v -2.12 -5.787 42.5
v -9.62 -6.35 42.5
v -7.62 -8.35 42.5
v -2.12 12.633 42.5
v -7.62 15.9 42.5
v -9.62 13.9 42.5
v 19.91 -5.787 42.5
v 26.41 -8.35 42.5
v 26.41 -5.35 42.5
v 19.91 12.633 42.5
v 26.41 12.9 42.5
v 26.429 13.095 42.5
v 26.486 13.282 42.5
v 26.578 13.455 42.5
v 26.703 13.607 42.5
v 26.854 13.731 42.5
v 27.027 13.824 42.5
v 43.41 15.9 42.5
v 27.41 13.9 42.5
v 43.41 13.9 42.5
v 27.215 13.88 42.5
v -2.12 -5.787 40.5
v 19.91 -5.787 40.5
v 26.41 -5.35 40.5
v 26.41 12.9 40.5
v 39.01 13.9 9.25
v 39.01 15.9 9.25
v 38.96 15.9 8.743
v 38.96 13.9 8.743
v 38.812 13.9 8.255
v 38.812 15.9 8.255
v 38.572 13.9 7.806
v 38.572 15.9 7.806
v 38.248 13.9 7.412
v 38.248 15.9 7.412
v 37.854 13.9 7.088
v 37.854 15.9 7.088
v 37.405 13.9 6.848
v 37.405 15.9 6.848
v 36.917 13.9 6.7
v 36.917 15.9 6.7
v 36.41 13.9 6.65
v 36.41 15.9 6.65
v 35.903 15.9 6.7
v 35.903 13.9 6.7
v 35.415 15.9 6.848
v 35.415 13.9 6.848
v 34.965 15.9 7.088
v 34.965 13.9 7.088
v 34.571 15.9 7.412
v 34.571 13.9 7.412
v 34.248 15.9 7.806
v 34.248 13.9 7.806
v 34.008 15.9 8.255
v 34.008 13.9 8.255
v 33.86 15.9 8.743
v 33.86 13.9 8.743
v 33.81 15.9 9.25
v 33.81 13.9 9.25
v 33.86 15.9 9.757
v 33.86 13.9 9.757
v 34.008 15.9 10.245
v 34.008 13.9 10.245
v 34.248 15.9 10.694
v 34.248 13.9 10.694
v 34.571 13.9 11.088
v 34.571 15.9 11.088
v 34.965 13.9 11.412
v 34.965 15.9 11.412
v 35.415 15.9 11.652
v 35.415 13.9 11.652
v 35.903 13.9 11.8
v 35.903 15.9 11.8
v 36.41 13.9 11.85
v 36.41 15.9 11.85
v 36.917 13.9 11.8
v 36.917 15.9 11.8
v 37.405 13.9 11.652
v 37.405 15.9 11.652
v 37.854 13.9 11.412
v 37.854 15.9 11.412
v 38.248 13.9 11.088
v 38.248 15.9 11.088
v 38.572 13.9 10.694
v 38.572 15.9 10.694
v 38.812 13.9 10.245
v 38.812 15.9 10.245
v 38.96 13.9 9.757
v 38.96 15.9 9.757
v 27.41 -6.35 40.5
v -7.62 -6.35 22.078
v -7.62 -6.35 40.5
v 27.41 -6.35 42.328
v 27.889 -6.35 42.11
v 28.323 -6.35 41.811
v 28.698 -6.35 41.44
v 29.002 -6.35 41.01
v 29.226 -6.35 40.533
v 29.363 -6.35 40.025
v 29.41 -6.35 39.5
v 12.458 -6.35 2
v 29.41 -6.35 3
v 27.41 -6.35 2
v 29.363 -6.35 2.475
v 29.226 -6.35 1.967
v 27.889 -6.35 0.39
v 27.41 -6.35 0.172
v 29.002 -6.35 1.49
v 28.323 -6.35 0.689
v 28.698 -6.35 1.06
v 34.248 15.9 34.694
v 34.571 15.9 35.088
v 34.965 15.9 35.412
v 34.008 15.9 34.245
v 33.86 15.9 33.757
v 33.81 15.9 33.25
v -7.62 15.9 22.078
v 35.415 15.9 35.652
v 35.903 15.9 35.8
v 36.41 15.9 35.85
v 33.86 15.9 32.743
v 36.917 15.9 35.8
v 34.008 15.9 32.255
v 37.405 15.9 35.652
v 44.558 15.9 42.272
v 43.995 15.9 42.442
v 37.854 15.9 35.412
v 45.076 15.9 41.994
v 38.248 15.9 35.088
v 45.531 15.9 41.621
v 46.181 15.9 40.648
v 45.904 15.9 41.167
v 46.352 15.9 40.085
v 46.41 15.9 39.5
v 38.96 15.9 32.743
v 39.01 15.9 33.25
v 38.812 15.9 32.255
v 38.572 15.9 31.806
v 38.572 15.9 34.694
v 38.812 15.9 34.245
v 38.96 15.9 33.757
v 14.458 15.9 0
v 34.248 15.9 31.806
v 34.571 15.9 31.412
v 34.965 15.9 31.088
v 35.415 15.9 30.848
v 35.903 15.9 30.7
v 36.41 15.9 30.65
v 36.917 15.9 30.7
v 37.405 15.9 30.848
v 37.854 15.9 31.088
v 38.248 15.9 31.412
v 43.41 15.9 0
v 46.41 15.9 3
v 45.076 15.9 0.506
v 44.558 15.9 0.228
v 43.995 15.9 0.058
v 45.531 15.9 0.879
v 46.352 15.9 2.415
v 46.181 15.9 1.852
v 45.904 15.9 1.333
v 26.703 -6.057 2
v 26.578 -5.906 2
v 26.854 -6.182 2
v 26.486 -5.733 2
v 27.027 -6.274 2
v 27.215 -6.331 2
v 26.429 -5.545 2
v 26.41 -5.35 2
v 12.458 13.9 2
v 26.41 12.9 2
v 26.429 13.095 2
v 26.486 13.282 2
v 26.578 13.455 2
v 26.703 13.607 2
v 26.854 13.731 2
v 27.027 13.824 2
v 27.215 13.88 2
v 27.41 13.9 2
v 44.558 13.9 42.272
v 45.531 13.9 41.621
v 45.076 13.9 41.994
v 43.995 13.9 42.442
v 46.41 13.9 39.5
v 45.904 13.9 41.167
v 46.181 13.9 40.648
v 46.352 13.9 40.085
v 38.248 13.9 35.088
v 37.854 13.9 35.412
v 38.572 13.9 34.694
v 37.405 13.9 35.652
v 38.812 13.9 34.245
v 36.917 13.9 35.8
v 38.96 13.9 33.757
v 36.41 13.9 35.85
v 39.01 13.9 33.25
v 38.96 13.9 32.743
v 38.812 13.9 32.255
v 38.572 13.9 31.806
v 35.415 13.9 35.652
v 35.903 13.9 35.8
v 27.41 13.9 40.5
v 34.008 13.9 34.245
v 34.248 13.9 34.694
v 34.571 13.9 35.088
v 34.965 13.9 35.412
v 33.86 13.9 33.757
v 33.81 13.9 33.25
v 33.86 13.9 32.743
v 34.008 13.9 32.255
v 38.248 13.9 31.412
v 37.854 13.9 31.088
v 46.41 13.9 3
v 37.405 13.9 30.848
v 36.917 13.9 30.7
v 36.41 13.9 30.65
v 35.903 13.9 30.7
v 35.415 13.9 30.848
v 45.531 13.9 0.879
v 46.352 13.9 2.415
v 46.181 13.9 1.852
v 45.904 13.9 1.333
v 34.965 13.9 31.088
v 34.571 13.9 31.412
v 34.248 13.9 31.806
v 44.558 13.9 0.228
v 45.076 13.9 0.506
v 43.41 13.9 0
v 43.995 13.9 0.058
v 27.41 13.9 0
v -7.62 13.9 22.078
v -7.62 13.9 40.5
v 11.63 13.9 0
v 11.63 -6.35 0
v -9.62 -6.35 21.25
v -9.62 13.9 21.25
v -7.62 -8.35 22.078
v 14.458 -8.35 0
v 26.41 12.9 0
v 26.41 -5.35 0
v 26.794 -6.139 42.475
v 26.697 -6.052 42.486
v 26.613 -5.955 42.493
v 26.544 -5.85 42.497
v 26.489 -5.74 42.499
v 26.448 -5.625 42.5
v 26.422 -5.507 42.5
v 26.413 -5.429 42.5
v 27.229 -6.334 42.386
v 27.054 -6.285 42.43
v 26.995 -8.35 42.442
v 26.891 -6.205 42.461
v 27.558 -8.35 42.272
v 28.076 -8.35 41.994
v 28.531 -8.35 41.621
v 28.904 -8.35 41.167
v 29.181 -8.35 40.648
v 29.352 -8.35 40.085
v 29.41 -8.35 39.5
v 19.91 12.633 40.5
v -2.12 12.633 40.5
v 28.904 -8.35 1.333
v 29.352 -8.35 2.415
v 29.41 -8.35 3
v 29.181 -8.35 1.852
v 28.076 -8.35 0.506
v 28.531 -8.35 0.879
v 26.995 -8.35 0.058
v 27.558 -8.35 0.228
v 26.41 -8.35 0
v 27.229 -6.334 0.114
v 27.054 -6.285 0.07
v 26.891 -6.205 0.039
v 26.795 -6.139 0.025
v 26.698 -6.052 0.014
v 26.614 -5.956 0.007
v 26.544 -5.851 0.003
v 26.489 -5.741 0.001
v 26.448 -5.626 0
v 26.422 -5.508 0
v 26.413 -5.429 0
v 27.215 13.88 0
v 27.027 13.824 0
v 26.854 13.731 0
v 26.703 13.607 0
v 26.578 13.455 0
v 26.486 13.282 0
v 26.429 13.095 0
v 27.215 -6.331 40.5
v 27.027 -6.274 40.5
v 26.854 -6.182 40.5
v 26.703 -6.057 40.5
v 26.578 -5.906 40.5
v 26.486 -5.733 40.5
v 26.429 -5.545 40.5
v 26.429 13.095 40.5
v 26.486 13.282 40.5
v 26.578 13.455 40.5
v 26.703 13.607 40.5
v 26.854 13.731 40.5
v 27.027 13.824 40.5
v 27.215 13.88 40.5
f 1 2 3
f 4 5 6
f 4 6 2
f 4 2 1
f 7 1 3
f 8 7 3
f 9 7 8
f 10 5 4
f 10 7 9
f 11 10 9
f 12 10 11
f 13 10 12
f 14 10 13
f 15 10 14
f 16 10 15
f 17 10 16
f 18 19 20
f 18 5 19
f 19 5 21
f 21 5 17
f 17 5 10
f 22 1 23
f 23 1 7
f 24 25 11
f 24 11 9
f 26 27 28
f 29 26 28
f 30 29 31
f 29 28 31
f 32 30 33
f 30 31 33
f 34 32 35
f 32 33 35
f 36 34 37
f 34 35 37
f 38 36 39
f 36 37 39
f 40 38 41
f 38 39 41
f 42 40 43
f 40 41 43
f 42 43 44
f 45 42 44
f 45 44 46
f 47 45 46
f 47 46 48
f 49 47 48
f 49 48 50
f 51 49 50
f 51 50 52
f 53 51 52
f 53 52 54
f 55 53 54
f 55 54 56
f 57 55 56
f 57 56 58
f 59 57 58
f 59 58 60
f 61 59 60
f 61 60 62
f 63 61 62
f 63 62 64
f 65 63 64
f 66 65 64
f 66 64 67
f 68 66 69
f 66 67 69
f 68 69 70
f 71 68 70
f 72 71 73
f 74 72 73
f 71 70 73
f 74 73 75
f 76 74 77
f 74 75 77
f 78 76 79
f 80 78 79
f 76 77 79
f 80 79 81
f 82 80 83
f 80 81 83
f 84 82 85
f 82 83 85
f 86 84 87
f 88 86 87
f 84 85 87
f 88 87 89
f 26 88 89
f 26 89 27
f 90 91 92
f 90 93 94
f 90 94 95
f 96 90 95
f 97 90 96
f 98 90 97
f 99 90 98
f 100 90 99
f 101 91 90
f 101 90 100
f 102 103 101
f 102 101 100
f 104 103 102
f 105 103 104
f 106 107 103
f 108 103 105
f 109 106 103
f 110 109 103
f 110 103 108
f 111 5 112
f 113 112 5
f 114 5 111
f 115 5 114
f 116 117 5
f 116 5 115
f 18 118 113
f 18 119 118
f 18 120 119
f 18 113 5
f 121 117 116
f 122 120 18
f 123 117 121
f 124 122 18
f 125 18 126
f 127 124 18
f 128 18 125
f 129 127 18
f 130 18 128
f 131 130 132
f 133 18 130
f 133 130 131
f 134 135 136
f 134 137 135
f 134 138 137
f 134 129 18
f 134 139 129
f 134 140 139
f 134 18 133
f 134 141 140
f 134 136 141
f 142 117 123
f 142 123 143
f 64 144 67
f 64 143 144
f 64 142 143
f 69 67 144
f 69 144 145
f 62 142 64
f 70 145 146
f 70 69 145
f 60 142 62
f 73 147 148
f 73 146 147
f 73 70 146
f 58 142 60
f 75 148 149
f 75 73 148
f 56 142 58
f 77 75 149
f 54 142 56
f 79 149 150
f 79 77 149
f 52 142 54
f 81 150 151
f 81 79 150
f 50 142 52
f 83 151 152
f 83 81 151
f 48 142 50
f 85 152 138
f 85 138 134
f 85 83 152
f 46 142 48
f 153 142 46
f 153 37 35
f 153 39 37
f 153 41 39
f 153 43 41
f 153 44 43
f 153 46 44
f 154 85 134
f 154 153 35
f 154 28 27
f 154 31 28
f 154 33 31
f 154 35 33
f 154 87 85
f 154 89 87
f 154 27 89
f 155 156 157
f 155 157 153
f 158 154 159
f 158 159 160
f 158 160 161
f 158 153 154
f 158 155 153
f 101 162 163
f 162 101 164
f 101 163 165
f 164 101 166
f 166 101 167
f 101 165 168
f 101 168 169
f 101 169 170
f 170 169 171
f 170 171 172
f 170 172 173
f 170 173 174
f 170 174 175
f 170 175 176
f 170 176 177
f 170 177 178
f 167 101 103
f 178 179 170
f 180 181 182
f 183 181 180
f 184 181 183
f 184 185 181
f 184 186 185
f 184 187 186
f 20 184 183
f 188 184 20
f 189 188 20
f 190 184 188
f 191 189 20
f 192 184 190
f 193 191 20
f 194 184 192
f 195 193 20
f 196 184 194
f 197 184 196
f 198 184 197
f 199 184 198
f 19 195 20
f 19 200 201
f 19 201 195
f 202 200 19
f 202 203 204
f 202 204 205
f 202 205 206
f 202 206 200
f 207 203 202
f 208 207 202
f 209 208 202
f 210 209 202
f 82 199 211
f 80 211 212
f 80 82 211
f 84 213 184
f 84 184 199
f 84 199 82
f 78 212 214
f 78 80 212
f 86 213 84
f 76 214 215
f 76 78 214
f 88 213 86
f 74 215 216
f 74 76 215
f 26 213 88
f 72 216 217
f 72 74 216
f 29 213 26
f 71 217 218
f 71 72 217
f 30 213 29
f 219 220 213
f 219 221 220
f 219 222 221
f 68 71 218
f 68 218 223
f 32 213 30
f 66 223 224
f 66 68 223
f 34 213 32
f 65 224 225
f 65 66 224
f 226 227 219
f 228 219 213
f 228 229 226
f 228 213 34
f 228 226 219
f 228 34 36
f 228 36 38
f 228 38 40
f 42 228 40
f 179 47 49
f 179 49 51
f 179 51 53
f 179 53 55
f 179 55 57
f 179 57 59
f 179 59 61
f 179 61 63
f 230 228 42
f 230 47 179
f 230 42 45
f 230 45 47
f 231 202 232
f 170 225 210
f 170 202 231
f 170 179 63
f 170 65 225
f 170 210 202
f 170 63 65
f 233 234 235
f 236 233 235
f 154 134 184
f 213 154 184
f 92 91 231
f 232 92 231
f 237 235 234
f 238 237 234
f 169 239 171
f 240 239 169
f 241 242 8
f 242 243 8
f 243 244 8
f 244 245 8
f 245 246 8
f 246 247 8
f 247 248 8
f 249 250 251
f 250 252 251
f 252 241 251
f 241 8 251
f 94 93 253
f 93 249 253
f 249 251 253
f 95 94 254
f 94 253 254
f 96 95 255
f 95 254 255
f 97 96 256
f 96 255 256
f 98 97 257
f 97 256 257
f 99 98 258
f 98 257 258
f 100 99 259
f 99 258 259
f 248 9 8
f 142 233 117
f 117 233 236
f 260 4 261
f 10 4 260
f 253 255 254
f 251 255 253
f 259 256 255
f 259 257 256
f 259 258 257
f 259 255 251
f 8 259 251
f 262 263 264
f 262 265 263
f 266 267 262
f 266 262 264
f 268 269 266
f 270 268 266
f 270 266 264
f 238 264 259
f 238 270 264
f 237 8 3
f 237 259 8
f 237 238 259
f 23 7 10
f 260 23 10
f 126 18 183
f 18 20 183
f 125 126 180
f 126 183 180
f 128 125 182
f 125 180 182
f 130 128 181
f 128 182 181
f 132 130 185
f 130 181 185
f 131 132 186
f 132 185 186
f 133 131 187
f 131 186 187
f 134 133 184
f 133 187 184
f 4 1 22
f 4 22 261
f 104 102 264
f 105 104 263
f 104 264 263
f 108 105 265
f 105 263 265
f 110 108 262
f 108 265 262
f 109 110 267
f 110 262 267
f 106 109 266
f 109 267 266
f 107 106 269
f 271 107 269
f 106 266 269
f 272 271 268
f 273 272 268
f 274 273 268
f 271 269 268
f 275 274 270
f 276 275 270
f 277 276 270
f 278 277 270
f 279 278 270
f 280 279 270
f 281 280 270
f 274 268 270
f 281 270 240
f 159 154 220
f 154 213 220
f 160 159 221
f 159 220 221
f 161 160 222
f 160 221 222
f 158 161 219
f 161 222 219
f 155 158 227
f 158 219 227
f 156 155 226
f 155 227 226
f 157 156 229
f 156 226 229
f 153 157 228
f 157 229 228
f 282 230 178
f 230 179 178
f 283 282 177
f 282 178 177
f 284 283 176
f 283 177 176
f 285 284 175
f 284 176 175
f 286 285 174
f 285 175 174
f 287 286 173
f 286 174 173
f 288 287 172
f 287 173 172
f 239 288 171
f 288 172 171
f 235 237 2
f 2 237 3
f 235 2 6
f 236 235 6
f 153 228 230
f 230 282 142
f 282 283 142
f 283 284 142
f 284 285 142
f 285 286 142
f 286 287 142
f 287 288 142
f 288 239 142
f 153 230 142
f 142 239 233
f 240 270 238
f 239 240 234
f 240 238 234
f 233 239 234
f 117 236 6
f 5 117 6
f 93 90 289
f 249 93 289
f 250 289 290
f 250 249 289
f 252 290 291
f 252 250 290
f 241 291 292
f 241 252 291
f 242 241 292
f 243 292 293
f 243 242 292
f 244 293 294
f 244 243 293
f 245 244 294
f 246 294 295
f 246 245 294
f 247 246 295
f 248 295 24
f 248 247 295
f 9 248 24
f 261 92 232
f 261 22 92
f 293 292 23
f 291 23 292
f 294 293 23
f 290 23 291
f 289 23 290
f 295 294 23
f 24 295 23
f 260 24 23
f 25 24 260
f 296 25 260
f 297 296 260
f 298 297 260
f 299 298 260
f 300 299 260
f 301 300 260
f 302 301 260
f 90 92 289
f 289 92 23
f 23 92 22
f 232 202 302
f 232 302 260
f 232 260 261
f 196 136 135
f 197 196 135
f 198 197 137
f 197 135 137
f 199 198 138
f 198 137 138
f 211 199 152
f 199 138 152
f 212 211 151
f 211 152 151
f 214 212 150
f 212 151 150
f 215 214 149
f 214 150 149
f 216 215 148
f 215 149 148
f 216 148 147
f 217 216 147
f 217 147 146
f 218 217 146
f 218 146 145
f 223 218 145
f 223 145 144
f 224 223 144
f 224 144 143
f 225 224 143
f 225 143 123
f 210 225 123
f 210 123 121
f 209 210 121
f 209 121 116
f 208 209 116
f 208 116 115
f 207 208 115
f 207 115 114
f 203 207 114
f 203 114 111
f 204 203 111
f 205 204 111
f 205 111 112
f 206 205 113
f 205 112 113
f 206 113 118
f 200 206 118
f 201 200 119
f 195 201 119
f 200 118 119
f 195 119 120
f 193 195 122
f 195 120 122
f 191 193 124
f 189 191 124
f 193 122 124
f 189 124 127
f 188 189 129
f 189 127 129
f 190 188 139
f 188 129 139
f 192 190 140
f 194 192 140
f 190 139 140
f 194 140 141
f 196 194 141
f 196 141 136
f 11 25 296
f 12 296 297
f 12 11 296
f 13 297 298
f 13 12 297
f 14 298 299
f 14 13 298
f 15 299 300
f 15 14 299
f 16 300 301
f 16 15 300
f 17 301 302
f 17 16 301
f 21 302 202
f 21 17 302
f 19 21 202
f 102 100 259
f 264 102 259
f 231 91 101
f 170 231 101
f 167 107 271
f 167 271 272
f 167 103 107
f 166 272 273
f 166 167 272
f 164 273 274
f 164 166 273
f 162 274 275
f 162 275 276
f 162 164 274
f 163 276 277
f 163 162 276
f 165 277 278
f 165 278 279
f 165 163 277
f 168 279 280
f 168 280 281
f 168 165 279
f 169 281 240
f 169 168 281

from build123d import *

# Parameters (mm, degrees)
SKETCH1_W           = 32.03
SKETCH1_H           = 20.25
BOSS_EXTRUDE1_DEPTH = 42.5
SKETCH2_W           = 32.03
SKETCH2_H           = 20.25
SKETCH2_W_2         = 22.03
SKETCH2_H_2         = 18.42
BOSS_EXTRUDE2_DEPTH = 2
CUT_EXTRUDE1_DEPTH  = 25.25
FILLET1_R           = 3
SKETCH6_R           = 2.6
CUT_EXTRUDE3_DEPTH  = 25.25
CHAMFER2_SIZE       = 2
BOSS_EXTRUDE3_REACH = 24.25
CUT_EXTRUDE4_REACH  = 38.03
SKETCH8_W           = 38.5
SKETCH8_H           = 20.25
FILLET2_R           = 1


with BuildPart() as part:
    # Sketch1 → Boss-Extrude1 (new body)
    with BuildSketch(Plane.XY):
        Polygon((26.409748294, 13.899702025), (26.409748294, -6.350297975), (29.409748294, -6.350297975), (29.409748294, -8.350297975), (-9.620251706, -8.350297975), (-9.620251706, 15.899702025), (46.409748294, 15.899702025), (46.409748294, 13.899702025), align=None)
        with Locations((8.394748294, 3.774702025)):
            Rectangle(SKETCH1_W, SKETCH1_H, mode=Mode.SUBTRACT)
    extrude(amount=BOSS_EXTRUDE1_DEPTH)

    # Sketch2 → Boss-Extrude2 (add)
    with BuildSketch(Plane.XY.offset(42.5)):
        with Locations((8.394748294, 3.774702025)):
            Rectangle(SKETCH2_W, SKETCH2_H)
        with Locations((8.894748294, 3.422592454)):
            Rectangle(SKETCH2_W_2, SKETCH2_H_2, mode=Mode.SUBTRACT)
    extrude(amount=-BOSS_EXTRUDE2_DEPTH)

    # Sketch3 → Cut-Extrude1 (cut, through all)
    with BuildSketch(Plane.XZ.offset(8.350297975)):
        Polygon((-9.620251706, 0), (-9.620251706, 21.25), (11.629748294, 0), align=None)
    extrude(amount=-CUT_EXTRUDE1_DEPTH, mode=Mode.SUBTRACT)

    # Fillet1
    fillet1_edges = [part.edges().sort_by_distance(p)[0] for p in [
        (46.409748294, 14.899702025, 0),
        (29.409748294, -7.350297975, 0),
        (46.409748294, 14.899702025, 42.5),
        (29.409748294, -7.350297975, 42.5),
    ]]
    fillet(fillet1_edges, radius=FILLET1_R)

    # Sketch6 → Cut-Extrude3 (cut, through all)
    with BuildSketch(Plane(origin=(0, 15.899702025, 0), x_dir=(1, 0, 0), z_dir=(0, 1, 0))):
        with Locations((36.409748294, -33.25)):
            Circle(SKETCH6_R)
        with Locations((36.409748294, -9.25)):
            Circle(SKETCH6_R)
    extrude(amount=-CUT_EXTRUDE3_DEPTH, mode=Mode.SUBTRACT)

    # Chamfer2
    chamfer2_edges = [part.edges().sort_by_distance(p)[0] for p in [
        (1.004748294, 15.899702025, 10.625),
        (-9.620251706, 15.899702025, 31.875),
        (1.004748294, -8.350297975, 10.625),
        (-9.620251706, -8.350297975, 31.875),
    ]]
    chamfer(chamfer2_edges, length=CHAMFER2_SIZE)

    # Sketch7 → Boss-Extrude3 (add, up to next)
    with BuildSketch(Plane(origin=(0, -6.350297975, 0), x_dir=(1, 0, 0), z_dir=(0, 1, 0)), mode=Mode.PRIVATE) as boss_extrude3_sk1:
        Polygon((24.409748294, 0), (11.629748294, 0), (-7.620251706, -19.25), (-7.620251706, -22.078427125), (12.458175419, -2), (24.409748294, -2), align=None)
    boss_extrude3_tool1 = extrude(boss_extrude3_sk1.sketch, amount=BOSS_EXTRUDE3_REACH, mode=Mode.PRIVATE) - part.part
    add(boss_extrude3_tool1.solids().sort_by_distance((18.019748, -6.350298, 0.389022))[0])

    # Sketch8 → Cut-Extrude4 (cut, up to next)
    with BuildSketch(Plane(origin=(26.409748294, 0, 0), x_dir=(0, 0, -1), z_dir=(1, 0, 0)), mode=Mode.PRIVATE) as cut_extrude4_sk1:
        with Locations((-21.25, 3.774702025)):
            Rectangle(SKETCH8_W, SKETCH8_H)
    cut_extrude4_tool1 = extrude(cut_extrude4_sk1.sketch, amount=-CUT_EXTRUDE4_REACH, mode=Mode.PRIVATE) & part.part
    add(cut_extrude4_tool1.solids().sort_by_distance((26.409748, 3.774702, 21.25))[0], mode=Mode.SUBTRACT)

    # Fillet2
    fillet2_edges = [part.edges().sort_by_distance(p)[0] for p in [
        (26.409748294, 13.899702025, 1),
        (26.409748294, -6.350297975, 1),
        (26.409748294, 13.899702025, 41.5),
        (26.409748294, -6.350297975, 41.5),
    ]]
    fillet(fillet2_edges, radius=FILLET2_R)


solid = part.part
